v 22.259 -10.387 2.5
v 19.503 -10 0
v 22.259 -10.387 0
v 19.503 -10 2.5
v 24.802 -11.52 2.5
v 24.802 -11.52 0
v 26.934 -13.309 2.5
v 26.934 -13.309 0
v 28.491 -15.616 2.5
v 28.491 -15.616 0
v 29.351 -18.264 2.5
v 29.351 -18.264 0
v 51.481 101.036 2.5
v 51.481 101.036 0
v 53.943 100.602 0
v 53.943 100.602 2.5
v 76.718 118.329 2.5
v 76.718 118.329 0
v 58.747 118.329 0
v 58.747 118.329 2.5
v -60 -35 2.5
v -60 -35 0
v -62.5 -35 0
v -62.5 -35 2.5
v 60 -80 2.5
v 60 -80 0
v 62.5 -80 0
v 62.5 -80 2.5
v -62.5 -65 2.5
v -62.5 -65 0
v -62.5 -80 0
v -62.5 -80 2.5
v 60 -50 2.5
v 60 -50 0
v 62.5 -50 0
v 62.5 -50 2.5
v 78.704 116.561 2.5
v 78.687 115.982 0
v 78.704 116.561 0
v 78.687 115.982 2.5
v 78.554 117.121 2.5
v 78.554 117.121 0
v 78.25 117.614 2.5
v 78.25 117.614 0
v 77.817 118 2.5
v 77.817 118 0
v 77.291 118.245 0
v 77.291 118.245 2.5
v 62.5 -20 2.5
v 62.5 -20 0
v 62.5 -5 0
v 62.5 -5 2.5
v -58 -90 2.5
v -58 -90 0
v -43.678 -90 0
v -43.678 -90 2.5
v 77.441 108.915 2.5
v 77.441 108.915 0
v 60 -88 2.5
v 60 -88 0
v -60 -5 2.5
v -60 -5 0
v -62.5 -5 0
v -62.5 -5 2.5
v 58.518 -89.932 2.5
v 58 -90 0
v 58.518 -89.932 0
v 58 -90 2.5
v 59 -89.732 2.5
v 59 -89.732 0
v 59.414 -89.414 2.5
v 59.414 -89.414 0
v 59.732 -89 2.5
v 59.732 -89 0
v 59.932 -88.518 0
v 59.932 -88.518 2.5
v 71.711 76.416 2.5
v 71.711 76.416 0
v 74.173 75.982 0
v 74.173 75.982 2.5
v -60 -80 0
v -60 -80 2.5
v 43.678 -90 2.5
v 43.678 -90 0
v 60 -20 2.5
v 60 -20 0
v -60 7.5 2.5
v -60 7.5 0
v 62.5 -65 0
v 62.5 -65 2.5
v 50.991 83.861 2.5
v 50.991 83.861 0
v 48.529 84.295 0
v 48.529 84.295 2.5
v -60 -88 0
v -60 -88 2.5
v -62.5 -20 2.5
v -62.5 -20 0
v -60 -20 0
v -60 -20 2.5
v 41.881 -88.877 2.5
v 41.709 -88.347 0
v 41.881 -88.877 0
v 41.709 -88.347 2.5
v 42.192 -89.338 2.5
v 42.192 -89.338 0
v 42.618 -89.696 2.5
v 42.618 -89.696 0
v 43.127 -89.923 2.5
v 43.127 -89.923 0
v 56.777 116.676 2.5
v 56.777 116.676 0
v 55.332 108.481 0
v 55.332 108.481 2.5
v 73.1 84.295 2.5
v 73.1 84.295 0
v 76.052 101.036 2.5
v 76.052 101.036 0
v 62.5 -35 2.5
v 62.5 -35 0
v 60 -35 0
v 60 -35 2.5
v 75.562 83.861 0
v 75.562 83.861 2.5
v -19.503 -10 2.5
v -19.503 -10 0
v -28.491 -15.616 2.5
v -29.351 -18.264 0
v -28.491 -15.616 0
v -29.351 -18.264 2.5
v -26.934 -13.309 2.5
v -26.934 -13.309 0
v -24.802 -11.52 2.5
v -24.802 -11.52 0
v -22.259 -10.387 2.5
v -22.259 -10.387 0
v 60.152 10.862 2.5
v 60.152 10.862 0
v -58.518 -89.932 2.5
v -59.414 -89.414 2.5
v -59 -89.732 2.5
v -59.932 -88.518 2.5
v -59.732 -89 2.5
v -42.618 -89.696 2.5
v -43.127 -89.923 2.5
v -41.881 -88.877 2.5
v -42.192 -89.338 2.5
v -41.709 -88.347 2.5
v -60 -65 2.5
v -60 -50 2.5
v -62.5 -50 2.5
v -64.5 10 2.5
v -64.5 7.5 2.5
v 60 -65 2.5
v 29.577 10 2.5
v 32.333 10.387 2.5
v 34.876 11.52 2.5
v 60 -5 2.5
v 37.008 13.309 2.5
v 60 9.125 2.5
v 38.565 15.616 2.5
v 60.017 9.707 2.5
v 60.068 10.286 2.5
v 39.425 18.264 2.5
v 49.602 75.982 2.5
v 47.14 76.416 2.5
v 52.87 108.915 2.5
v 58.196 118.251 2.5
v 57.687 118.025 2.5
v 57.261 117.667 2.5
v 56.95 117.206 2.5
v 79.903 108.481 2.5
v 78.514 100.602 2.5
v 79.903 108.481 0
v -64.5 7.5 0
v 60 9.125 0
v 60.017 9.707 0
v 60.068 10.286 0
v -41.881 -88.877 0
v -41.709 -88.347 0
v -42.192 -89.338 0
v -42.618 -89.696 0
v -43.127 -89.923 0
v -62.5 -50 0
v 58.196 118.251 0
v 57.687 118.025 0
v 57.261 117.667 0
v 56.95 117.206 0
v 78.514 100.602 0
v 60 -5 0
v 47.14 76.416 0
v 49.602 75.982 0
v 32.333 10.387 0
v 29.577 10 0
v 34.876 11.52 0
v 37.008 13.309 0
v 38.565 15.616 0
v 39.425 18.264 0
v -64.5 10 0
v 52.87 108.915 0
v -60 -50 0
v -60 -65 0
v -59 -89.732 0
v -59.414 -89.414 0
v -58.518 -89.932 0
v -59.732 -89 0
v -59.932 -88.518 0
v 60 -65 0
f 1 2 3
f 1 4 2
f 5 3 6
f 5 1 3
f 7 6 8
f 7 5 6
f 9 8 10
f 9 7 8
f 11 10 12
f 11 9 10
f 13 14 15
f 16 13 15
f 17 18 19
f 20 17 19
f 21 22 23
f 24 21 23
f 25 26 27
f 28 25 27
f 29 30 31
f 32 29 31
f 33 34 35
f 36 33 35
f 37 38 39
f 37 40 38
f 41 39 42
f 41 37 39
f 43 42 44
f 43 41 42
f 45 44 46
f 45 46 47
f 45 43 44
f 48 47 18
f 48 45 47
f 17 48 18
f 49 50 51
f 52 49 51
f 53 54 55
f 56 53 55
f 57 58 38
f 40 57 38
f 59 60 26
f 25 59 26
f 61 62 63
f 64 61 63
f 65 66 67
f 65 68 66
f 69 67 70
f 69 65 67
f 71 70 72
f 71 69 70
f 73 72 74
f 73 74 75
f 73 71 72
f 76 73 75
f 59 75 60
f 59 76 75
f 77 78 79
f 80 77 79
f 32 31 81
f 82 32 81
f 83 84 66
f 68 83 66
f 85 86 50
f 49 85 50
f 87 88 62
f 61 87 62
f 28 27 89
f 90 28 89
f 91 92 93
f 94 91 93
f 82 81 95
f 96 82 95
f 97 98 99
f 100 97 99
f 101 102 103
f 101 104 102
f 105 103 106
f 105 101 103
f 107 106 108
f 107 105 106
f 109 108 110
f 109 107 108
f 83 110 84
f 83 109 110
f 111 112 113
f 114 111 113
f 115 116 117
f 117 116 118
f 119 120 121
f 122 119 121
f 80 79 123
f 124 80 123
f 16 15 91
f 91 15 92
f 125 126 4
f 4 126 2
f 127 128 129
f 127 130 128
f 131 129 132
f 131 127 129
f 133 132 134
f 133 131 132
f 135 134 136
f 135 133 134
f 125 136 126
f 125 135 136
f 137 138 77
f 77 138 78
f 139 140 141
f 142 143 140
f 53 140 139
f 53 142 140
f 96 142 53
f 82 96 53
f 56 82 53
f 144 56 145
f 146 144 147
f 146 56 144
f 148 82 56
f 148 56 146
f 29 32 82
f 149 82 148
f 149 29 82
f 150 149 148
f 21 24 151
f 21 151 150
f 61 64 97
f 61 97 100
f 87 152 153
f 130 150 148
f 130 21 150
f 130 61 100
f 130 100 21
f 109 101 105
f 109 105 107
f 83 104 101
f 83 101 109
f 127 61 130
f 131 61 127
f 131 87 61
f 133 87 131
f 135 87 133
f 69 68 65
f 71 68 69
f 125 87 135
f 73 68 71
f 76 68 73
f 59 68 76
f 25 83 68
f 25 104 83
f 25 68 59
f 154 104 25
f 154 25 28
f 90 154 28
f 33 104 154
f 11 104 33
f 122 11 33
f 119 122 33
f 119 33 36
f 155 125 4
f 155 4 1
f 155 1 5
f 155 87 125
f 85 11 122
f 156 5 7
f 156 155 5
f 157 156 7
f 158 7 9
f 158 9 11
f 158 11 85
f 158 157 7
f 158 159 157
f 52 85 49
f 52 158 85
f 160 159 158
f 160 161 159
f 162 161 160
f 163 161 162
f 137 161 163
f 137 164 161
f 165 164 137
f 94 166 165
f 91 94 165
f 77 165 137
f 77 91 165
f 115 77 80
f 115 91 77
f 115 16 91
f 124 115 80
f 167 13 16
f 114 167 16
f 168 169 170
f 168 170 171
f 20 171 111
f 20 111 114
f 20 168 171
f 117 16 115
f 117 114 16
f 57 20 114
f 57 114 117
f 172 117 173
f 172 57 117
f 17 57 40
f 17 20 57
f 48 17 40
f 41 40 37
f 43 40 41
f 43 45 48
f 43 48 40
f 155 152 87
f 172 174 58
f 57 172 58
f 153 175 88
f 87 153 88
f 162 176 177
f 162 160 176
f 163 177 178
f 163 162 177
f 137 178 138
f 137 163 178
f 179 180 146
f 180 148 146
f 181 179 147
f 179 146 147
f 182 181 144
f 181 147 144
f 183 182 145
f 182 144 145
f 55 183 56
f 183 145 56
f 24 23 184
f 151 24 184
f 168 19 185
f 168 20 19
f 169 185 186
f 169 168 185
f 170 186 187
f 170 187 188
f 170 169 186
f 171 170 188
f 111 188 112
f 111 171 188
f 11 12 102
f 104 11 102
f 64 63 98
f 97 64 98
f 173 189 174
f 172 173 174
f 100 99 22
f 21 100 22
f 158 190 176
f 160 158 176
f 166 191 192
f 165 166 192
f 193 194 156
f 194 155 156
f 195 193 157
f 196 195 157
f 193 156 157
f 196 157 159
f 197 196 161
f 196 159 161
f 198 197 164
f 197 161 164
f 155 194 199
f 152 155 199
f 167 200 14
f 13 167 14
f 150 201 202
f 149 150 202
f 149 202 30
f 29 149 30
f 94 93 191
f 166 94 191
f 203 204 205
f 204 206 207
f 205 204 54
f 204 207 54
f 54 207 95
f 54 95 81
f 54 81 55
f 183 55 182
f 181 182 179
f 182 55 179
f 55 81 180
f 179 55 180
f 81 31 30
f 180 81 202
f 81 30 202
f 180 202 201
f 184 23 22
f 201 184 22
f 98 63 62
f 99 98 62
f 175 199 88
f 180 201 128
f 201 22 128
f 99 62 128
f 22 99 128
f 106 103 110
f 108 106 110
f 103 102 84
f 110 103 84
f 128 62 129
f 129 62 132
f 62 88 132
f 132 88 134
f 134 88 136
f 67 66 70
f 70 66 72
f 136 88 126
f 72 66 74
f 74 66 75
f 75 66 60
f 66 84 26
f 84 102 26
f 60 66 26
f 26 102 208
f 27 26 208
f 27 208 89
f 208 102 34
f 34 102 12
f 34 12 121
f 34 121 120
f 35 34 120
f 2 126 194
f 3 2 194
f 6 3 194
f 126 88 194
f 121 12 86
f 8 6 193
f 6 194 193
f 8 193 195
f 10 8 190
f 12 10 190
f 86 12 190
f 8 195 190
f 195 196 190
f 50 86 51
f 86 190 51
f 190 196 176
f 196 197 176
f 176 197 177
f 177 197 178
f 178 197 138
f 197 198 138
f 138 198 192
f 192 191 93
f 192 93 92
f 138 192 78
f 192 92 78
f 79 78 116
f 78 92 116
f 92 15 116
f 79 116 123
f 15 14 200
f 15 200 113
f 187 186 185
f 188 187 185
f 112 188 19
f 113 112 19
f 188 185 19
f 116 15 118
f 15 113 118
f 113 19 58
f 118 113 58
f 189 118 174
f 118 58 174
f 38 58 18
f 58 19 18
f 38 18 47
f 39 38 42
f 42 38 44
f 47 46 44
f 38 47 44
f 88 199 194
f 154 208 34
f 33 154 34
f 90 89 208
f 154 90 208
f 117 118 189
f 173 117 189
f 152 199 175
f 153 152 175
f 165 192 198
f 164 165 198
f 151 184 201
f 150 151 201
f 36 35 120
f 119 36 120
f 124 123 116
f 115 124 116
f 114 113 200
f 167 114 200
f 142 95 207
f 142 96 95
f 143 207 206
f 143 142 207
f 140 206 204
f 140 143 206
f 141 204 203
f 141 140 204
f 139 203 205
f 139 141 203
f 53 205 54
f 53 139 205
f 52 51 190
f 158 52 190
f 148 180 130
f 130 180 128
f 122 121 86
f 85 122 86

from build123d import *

# Parameters (mm, degrees)
BOSS_EXTRUDE1_DEPTH = 2.5
FILLET1_R           = 2
FILLET2_R           = 10


with BuildPart() as part:
    # Sketch1 → Boss-Extrude1 (new body)
    with BuildSketch(Plane.XY):
        Polygon((-42, -90), (-27.893841543, -10), (27.893841543, -10), (42, -90), (60, -90), (60, -80), (62.5, -80), (62.5, -65), (60, -65), (60, -50), (62.5, -50), (62.5, -35), (60, -35), (60, -20), (62.5, -20), (62.5, -5), (60, -5), (60, 10), (71.710975051, 76.416239896), (74.172994433, 75.982119452), (75.562179855, 83.860581476), (73.100160472, 84.29470192), (76.052179493, 101.036433721), (78.514198875, 100.602313277), (79.903384296, 108.480775301), (77.441364914, 108.914895745), (79.101299543, 118.328852831), (57.068895795, 118.328852831), (55.332414019, 108.480775301), (52.870394636, 108.914895745), (51.481209215, 101.036433721), (53.943228597, 100.602313277), (50.991209577, 83.860581476), (48.529190194, 84.29470192), (47.140004773, 76.416239896), (49.602024156, 75.982119452), (37.967596252, 10), (-64.5, 10), (-64.5, 7.5), (-60, 7.5), (-60, -5), (-62.5, -5), (-62.5, -20), (-60, -20), (-60, -35), (-62.5, -35), (-62.5, -50), (-60, -50), (-60, -65), (-62.5, -65), (-62.5, -80), (-60, -80), (-60, -90), align=None)
    extrude(amount=BOSS_EXTRUDE1_DEPTH)

    # Fillet1
    fillet1_edges = [part.edges().sort_by_distance(p)[0] for p in [
        (60, -90, 1.25),
        (42, -90, 1.25),
        (-42, -90, 1.25),
        (-60, -90, 1.25),
        (57.068895795, 118.328852831, 1.25),
        (79.101299543, 118.328852831, 1.25),
    ]]
    fillet(fillet1_edges, radius=FILLET1_R)

    # Fillet2
    fillet2_edges = [part.edges().sort_by_distance(p)[0] for p in [
        (27.893841543, -10, 1.25),
        (-27.893841543, -10, 1.25),
        (37.967596252, 10, 1.25),
        (60, 10, 1.25),
    ]]
    fillet(fillet2_edges, radius=FILLET2_R)


solid = part.part
